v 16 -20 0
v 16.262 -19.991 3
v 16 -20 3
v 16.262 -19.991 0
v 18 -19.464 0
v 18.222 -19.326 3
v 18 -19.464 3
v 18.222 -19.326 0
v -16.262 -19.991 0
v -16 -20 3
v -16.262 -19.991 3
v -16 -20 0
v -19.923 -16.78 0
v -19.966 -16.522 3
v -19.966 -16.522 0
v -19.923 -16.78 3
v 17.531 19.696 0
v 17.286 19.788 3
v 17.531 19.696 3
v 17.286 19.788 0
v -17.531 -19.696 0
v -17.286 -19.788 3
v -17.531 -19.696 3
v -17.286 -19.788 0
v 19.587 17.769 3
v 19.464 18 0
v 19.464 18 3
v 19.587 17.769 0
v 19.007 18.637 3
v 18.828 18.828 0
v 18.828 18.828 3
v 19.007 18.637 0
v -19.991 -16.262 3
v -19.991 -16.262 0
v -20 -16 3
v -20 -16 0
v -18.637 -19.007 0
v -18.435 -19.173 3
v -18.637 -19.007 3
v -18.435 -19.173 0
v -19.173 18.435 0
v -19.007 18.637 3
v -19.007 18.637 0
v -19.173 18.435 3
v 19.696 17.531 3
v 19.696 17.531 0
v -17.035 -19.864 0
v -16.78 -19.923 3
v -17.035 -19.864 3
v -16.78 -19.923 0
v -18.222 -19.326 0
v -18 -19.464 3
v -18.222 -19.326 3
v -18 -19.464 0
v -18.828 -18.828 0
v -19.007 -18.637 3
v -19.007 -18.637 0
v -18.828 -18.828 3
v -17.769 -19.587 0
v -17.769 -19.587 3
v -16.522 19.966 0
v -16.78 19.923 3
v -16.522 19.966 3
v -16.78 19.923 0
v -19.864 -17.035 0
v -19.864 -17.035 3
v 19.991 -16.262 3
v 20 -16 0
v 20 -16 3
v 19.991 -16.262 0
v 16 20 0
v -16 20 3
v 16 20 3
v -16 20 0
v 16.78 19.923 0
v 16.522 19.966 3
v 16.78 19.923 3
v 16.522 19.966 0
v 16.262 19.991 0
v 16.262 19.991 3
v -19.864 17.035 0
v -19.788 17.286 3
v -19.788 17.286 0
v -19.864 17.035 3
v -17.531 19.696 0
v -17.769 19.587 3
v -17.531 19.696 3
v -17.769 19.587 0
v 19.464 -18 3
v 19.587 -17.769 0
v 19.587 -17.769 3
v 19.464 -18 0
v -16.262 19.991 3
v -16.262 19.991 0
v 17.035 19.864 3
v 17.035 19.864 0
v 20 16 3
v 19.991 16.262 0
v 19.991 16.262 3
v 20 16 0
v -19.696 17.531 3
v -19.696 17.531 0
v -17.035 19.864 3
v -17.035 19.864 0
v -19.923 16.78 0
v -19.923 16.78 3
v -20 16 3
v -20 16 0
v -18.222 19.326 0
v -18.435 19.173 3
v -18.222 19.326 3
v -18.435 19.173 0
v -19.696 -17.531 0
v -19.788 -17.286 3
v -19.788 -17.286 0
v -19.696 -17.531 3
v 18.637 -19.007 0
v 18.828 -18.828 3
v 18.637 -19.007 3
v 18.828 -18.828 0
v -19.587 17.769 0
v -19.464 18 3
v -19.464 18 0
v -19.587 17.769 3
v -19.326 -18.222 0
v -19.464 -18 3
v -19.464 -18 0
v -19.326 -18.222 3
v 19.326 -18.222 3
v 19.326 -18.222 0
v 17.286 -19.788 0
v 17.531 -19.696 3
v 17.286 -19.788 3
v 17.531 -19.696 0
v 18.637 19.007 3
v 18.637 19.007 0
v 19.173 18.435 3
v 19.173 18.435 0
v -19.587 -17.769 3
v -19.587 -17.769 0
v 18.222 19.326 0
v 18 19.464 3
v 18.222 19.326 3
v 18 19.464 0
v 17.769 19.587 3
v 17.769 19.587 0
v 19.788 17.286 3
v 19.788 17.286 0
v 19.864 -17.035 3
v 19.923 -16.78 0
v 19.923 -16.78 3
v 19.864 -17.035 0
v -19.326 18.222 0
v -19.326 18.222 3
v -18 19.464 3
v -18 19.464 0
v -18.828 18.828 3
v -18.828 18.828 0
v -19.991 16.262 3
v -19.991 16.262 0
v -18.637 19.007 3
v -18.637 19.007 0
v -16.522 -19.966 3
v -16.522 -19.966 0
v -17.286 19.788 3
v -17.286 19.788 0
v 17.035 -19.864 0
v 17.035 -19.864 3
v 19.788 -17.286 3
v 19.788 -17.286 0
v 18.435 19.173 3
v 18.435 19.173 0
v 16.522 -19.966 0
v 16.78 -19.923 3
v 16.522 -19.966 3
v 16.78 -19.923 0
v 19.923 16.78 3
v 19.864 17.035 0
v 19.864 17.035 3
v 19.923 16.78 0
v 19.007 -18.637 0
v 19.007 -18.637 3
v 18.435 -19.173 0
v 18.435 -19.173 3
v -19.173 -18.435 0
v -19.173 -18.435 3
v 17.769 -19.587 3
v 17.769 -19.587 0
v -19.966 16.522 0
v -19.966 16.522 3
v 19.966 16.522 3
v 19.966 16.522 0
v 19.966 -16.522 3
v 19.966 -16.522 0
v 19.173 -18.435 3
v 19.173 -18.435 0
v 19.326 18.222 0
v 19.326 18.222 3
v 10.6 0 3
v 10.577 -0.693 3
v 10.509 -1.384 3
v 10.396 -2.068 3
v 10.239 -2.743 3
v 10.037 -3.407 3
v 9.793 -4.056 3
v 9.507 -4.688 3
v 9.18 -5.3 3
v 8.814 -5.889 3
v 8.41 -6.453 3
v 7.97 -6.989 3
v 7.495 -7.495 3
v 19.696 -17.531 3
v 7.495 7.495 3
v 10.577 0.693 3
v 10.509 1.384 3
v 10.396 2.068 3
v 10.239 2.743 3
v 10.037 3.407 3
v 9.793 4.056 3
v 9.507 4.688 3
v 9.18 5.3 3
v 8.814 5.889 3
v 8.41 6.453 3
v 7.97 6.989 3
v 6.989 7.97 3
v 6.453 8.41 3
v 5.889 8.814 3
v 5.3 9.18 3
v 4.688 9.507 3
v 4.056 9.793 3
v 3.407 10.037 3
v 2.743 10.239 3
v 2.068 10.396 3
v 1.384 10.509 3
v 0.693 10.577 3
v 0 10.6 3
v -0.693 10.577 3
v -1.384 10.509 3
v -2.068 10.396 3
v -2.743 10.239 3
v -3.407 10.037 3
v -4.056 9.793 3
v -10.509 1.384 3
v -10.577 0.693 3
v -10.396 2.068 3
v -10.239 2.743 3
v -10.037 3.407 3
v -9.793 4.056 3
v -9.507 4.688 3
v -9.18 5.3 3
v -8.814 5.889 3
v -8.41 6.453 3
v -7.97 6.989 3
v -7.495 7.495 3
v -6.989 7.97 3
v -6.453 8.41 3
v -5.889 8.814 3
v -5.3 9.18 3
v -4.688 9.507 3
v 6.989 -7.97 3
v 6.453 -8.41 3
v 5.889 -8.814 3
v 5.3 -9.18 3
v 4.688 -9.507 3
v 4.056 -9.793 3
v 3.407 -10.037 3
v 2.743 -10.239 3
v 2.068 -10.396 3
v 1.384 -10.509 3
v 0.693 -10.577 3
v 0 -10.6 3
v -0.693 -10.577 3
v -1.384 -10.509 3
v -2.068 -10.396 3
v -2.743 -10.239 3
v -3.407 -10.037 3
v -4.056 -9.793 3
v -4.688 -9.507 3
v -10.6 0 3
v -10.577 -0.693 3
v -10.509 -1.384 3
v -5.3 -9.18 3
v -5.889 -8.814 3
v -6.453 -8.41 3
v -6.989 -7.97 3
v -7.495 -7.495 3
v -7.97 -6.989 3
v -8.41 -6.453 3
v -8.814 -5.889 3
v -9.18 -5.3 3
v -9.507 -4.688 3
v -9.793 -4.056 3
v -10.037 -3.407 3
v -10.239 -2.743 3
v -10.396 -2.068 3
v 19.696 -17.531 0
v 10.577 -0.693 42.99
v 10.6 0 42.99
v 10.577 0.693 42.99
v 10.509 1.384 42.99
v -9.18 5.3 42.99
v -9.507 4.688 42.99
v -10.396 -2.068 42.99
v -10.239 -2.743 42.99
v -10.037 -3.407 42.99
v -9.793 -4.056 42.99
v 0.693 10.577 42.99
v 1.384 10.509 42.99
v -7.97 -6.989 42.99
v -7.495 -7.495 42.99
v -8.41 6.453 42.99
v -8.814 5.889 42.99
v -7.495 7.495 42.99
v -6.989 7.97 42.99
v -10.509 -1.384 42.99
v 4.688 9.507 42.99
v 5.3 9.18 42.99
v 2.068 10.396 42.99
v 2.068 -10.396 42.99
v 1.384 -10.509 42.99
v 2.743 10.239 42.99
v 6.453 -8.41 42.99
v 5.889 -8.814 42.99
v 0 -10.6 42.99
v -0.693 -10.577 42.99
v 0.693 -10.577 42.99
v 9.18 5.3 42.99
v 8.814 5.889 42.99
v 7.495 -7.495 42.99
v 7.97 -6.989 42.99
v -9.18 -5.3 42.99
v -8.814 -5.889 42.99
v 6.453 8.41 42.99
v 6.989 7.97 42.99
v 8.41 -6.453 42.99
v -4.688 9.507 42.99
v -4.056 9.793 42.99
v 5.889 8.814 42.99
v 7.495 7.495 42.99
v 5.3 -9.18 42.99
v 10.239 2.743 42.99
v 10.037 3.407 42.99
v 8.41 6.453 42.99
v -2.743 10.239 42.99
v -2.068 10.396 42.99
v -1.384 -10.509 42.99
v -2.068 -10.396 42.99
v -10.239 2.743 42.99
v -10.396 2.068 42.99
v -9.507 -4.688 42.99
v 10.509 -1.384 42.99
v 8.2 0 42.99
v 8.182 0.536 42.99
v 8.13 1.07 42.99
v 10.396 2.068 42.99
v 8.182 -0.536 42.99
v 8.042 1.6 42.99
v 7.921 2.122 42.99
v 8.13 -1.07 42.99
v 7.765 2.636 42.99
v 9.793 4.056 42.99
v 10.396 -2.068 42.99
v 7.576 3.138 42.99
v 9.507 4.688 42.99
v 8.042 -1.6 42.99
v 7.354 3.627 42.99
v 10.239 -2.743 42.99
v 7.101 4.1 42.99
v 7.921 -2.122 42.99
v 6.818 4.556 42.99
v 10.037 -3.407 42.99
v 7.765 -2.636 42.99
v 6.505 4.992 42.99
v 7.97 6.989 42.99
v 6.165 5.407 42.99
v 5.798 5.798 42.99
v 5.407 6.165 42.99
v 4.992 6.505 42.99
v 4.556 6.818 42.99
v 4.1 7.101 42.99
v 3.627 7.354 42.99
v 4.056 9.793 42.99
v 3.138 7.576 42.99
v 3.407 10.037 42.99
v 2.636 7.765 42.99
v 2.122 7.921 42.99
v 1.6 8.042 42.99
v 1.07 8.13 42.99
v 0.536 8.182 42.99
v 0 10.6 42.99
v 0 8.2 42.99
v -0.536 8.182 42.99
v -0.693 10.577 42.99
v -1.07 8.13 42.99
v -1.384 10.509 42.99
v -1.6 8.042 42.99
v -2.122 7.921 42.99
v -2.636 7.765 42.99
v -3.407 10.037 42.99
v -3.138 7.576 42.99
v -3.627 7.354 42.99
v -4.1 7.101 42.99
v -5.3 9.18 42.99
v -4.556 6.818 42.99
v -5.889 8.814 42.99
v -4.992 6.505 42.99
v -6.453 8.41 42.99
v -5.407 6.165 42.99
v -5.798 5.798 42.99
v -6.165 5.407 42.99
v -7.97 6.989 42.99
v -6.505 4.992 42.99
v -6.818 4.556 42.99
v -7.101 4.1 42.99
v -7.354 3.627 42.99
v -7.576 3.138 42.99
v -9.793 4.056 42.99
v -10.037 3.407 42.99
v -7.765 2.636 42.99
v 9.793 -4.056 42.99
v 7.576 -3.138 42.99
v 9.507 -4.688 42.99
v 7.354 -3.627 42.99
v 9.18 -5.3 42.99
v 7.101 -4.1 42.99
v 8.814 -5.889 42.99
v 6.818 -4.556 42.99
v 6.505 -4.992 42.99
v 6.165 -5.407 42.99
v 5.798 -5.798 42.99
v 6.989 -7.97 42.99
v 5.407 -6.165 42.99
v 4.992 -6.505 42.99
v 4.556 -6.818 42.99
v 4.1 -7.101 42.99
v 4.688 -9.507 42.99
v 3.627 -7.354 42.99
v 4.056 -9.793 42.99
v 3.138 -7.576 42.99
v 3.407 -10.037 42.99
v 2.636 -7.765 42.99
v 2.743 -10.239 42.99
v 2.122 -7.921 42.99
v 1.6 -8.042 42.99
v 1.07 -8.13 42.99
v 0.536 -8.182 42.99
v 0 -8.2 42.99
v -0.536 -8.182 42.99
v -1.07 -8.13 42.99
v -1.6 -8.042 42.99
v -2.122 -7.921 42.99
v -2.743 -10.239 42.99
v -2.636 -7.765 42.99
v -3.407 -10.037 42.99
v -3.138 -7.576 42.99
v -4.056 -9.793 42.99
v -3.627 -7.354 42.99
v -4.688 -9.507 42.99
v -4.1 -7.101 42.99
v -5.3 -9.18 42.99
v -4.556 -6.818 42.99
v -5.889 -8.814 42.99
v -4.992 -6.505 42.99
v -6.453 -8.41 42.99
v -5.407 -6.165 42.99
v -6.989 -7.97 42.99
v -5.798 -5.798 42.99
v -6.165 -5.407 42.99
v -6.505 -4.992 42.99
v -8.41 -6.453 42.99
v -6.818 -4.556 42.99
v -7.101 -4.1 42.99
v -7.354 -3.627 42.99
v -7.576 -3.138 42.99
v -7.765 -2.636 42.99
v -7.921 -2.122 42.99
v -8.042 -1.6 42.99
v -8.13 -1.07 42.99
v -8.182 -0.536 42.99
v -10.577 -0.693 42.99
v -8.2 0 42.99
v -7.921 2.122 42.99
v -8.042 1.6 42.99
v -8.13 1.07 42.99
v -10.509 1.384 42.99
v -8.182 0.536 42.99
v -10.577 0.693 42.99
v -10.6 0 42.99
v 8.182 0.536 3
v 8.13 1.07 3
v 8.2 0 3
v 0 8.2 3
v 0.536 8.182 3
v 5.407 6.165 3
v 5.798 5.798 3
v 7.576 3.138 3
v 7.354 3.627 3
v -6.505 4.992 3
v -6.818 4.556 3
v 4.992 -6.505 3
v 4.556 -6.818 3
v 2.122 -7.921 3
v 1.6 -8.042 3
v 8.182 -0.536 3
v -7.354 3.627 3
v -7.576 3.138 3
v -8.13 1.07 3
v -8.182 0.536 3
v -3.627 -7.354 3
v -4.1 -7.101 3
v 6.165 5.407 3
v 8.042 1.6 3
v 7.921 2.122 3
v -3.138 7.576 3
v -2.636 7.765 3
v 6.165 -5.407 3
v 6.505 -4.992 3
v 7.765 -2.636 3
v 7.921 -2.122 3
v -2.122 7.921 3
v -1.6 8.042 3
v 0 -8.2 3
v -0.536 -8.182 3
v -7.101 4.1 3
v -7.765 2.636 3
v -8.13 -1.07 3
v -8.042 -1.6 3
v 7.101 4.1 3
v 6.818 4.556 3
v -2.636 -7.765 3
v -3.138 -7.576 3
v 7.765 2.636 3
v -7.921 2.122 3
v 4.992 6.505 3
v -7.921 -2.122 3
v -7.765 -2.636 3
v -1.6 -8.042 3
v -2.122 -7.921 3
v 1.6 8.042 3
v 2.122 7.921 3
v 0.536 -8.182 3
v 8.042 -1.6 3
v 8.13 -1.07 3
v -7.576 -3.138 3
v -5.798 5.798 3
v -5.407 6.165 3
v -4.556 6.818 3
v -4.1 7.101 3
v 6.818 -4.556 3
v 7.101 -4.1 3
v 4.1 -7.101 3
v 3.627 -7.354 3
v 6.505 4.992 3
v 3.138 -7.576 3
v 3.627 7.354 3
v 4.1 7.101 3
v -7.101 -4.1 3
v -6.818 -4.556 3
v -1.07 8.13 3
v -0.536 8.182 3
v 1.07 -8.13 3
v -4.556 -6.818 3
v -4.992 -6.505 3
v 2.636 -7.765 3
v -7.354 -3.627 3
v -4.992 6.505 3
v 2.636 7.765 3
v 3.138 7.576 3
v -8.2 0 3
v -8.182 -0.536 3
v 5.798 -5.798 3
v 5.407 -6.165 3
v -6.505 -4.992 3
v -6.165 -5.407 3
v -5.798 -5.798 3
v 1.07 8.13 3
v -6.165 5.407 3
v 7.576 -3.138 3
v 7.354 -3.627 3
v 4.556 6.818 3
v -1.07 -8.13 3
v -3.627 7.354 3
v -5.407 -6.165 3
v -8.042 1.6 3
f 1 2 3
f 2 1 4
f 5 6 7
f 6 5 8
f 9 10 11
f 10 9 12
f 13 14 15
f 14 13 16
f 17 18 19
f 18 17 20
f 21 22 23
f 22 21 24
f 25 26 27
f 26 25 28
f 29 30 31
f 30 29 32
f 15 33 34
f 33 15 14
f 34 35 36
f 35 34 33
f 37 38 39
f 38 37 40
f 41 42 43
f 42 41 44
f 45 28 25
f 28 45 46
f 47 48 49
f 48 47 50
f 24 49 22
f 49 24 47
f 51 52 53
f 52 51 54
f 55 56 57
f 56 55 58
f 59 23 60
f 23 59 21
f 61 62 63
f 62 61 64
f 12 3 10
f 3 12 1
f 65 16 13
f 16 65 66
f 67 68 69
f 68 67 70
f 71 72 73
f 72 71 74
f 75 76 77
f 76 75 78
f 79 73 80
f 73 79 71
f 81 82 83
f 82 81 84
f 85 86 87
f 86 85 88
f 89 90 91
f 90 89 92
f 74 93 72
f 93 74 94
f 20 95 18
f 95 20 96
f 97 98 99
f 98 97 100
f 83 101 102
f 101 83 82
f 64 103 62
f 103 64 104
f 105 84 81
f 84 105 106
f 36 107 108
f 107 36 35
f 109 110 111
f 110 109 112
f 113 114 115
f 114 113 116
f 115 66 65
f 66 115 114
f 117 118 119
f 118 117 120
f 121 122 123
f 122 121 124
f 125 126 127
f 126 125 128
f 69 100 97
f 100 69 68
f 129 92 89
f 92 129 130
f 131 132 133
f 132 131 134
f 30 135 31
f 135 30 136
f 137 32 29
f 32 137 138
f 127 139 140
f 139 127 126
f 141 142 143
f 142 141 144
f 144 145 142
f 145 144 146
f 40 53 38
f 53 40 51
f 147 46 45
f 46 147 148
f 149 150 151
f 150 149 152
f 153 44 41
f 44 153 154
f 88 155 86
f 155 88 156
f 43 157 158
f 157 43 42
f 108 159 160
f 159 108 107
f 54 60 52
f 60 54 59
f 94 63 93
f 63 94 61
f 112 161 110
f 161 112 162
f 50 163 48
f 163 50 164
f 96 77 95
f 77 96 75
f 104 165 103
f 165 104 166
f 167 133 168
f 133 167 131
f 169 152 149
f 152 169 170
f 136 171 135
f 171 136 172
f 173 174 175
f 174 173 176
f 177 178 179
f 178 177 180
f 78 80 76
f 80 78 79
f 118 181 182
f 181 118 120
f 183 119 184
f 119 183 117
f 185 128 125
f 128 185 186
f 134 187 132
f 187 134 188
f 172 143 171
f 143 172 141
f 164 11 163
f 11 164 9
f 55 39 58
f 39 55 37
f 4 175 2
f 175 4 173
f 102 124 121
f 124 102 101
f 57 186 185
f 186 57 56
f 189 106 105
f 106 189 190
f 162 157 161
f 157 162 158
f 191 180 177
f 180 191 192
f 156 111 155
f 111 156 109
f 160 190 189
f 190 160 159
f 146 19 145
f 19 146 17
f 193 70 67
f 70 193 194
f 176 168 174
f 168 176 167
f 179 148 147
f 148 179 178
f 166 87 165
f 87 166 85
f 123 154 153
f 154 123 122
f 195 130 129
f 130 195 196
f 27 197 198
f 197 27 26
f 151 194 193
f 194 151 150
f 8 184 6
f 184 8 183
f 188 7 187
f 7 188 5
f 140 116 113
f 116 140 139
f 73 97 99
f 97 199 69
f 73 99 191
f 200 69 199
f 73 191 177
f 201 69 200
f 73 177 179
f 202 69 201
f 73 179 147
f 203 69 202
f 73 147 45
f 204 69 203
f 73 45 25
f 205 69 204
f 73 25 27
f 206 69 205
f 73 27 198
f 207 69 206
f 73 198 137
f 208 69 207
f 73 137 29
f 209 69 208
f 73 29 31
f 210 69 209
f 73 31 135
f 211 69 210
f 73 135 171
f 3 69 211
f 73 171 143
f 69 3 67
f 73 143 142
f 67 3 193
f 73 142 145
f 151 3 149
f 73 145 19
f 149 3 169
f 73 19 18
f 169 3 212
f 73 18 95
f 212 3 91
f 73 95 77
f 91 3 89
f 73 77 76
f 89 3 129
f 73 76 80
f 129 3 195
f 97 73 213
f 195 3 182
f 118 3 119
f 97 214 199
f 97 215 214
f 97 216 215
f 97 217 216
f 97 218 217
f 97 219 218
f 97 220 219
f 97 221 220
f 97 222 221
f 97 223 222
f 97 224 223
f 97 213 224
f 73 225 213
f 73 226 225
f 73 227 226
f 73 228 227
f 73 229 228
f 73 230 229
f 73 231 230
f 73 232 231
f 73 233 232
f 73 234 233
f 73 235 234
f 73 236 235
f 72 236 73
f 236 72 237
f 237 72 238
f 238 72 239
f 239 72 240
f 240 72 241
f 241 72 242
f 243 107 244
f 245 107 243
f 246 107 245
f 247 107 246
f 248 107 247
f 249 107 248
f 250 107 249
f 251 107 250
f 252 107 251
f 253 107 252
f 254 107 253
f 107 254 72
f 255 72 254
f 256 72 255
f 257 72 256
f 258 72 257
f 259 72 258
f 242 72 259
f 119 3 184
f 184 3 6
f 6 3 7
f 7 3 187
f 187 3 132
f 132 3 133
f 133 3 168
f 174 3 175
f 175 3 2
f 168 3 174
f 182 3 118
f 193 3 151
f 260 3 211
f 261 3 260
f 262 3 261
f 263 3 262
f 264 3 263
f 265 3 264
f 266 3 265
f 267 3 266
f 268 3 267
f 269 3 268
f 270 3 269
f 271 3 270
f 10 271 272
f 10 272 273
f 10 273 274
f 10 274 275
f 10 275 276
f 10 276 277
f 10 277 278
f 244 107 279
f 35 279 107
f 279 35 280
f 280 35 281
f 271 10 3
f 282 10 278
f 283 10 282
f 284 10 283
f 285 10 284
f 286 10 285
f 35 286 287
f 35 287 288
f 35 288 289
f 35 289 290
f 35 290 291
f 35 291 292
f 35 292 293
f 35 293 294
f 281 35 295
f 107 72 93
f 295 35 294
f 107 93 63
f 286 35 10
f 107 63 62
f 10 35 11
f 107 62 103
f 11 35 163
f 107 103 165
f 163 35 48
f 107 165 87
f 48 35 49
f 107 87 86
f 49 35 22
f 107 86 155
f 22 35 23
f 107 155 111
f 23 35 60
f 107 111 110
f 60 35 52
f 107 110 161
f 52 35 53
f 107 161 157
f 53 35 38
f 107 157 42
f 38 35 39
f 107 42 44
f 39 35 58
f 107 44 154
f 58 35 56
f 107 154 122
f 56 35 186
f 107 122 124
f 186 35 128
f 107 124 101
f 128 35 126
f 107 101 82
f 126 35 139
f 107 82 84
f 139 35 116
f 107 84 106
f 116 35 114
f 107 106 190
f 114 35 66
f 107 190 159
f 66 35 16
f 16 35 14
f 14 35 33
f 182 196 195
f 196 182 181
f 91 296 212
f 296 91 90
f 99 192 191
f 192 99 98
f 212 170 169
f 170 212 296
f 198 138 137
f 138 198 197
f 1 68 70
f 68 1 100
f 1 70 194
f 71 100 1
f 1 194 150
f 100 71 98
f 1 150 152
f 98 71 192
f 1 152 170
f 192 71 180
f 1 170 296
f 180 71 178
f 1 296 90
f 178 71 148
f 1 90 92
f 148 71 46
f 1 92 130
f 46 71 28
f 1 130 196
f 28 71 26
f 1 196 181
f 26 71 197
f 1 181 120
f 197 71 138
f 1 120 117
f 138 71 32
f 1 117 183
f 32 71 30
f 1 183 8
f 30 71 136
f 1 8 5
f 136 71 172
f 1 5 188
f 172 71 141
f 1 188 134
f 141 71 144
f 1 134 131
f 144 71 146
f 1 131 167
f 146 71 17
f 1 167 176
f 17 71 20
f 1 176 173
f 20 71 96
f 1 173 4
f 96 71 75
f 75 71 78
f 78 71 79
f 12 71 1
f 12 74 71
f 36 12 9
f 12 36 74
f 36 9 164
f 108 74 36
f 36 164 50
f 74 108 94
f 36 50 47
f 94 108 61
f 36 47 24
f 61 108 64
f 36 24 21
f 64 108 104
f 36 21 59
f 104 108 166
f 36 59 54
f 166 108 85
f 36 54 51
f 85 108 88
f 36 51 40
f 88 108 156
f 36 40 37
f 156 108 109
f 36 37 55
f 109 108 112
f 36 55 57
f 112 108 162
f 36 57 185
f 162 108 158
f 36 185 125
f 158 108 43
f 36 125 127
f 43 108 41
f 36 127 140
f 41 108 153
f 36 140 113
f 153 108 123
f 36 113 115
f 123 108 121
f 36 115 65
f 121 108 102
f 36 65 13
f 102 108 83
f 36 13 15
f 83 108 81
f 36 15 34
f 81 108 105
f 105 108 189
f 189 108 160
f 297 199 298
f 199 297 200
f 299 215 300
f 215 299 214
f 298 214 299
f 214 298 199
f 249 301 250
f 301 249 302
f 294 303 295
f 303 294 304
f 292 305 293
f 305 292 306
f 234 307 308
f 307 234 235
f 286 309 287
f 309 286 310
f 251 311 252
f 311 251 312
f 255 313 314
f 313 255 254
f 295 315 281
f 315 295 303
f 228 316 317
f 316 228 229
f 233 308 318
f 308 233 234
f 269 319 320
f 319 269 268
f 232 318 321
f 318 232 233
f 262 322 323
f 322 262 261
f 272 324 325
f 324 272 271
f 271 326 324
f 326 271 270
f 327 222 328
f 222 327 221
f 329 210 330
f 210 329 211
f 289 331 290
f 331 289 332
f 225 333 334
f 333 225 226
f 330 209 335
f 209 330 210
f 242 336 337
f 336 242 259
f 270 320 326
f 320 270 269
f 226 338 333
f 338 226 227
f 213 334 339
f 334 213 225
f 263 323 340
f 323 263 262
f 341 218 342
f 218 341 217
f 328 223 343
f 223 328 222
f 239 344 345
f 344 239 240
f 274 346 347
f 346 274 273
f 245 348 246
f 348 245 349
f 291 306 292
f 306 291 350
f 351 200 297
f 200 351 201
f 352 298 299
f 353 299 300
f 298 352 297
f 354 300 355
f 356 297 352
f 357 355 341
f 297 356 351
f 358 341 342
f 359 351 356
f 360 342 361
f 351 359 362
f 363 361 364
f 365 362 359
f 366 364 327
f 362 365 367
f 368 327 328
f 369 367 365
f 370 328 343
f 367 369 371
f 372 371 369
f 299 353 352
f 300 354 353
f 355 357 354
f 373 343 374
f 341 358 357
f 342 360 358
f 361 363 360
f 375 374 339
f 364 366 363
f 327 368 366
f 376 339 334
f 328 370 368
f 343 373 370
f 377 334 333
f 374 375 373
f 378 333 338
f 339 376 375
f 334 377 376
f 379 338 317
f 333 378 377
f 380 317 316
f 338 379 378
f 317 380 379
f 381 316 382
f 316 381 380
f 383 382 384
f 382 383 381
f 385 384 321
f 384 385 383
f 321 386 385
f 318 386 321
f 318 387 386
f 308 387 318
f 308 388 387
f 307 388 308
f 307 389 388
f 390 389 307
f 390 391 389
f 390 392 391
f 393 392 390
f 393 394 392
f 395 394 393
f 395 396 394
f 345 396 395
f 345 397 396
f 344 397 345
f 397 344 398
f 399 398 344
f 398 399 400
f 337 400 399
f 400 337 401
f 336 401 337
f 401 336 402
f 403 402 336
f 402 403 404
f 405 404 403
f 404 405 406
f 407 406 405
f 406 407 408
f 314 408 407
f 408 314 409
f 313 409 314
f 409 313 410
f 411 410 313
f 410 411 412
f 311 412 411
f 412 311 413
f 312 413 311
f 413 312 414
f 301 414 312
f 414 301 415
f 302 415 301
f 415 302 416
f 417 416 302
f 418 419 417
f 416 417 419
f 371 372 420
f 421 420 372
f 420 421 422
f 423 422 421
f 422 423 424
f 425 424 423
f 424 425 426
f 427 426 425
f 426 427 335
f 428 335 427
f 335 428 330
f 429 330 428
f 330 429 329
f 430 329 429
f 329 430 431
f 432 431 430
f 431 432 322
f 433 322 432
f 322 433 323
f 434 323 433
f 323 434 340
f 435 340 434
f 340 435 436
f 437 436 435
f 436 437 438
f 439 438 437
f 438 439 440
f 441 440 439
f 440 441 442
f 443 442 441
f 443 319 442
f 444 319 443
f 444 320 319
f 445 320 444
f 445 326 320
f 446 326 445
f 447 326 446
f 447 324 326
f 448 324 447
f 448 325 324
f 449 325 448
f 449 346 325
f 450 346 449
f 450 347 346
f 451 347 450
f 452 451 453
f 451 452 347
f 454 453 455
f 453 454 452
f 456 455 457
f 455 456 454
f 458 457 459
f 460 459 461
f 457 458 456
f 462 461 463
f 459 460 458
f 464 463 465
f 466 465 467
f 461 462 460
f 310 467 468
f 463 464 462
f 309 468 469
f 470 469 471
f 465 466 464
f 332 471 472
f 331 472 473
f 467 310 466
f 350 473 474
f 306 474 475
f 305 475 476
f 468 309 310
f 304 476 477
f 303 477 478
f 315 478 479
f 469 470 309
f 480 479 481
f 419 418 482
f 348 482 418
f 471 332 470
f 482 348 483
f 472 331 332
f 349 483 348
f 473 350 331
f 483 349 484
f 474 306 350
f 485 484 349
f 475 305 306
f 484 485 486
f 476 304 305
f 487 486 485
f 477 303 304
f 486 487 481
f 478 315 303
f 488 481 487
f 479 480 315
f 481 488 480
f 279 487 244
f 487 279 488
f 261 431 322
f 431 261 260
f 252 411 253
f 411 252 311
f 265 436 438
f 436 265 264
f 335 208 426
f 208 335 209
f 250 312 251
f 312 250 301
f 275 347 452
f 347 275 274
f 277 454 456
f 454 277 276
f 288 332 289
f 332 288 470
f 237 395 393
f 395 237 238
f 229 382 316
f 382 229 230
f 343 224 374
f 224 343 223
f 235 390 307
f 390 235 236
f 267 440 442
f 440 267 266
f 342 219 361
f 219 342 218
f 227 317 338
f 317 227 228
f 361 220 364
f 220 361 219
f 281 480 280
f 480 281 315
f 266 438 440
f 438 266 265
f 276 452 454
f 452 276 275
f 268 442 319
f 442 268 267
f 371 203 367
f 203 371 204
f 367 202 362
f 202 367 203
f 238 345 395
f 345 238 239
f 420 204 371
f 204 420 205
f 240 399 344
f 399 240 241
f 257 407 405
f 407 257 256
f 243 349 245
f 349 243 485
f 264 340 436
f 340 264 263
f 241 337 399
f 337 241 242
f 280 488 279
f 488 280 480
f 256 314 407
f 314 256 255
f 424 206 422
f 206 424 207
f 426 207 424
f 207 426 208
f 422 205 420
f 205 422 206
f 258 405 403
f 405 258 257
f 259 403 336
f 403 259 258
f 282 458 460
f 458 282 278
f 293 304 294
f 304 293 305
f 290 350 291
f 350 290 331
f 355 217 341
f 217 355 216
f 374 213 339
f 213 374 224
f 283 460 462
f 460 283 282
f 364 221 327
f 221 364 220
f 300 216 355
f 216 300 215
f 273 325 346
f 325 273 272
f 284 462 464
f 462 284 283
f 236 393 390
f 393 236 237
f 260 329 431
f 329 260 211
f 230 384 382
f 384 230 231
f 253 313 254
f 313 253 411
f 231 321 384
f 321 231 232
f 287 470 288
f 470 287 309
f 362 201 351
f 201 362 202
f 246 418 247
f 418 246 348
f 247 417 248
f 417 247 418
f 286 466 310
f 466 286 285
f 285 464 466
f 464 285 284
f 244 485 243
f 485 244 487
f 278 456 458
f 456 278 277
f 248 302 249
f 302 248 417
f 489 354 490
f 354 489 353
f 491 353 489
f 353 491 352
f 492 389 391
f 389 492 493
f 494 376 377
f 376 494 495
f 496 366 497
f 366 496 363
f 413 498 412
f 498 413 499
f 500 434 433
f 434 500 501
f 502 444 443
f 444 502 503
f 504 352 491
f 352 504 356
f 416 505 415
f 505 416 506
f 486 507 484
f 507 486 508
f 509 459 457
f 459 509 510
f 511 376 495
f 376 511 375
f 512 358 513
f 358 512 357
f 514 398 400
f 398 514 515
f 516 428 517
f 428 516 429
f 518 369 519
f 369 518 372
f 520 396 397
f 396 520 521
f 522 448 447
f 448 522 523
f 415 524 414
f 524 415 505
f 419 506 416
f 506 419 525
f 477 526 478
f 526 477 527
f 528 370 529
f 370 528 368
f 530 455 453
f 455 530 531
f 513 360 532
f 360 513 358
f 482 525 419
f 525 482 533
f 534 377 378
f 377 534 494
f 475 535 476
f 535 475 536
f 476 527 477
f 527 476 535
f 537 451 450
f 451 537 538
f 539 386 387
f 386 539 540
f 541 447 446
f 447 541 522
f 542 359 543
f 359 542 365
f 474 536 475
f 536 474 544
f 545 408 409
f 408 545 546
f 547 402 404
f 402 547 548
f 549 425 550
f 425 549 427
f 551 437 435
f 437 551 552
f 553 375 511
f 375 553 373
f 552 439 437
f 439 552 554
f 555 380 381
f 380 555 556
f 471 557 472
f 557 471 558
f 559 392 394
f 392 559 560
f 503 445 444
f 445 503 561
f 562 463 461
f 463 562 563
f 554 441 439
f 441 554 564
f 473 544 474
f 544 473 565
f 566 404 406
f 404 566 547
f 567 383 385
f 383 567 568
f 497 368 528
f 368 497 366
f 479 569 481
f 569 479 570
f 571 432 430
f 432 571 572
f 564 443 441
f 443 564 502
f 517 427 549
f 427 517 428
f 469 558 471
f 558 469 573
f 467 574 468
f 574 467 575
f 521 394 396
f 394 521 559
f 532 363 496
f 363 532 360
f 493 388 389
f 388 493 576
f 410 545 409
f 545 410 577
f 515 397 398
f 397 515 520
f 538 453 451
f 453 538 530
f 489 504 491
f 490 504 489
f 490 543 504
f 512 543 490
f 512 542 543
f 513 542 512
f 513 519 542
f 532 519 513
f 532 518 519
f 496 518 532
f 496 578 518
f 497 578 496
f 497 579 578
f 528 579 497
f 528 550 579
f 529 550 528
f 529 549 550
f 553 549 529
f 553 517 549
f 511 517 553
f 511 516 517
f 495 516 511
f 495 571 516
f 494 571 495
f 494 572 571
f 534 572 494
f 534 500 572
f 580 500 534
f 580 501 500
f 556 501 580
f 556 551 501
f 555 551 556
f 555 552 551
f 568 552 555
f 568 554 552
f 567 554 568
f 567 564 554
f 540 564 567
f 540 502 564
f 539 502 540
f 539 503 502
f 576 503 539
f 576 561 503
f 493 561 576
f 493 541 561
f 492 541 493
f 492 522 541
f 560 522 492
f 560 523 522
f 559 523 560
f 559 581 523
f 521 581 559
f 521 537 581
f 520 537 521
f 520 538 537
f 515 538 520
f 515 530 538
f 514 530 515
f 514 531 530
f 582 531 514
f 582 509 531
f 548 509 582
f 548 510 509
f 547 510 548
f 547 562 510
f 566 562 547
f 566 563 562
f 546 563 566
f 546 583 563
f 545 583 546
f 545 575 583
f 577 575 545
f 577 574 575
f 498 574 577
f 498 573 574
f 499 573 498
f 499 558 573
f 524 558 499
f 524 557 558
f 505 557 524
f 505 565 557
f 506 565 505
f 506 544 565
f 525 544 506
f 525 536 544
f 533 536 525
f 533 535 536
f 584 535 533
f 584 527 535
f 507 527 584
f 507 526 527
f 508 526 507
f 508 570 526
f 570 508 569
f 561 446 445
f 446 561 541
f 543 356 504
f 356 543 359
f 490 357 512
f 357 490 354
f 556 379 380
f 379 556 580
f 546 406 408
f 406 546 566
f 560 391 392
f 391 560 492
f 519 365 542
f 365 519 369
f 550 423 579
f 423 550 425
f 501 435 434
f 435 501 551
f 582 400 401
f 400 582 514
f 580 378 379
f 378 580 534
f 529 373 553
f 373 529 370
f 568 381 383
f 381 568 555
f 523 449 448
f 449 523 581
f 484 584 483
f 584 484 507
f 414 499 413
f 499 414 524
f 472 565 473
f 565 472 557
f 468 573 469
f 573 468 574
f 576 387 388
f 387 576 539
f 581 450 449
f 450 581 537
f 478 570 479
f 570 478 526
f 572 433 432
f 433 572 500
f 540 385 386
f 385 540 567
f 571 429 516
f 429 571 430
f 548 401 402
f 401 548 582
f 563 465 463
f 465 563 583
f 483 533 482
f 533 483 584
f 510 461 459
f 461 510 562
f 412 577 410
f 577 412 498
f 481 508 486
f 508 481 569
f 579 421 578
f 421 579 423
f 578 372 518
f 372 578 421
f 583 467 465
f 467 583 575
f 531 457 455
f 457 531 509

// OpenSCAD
// Держатель для стандартной пробирки 16 × 100 мм, пробиркой вверх, без поддержек.
// Все размеры в мм.

tube_d   = 16;     // диаметр пробирки
clearance = 0.4;   // зазор на печать (диаметр)
wall     = 2.4;    // стенка
height   = 40;     // высота держателя
base_w   = 40;     // сторона квадратной плиты
base_h   = 3;      // толщина плиты
$fn      = 96;

bore_d = tube_d + clearance;

difference() {
    union() {
        linear_extrude(base_h) offset(r = 4) offset(delta = -4) square(base_w, center = true);
        translate([0, 0, base_h - 0.01]) cylinder(h = height, d = bore_d + 2 * wall);
    }
    translate([0, 0, base_h]) cylinder(h = height + 1, d = bore_d);
}
